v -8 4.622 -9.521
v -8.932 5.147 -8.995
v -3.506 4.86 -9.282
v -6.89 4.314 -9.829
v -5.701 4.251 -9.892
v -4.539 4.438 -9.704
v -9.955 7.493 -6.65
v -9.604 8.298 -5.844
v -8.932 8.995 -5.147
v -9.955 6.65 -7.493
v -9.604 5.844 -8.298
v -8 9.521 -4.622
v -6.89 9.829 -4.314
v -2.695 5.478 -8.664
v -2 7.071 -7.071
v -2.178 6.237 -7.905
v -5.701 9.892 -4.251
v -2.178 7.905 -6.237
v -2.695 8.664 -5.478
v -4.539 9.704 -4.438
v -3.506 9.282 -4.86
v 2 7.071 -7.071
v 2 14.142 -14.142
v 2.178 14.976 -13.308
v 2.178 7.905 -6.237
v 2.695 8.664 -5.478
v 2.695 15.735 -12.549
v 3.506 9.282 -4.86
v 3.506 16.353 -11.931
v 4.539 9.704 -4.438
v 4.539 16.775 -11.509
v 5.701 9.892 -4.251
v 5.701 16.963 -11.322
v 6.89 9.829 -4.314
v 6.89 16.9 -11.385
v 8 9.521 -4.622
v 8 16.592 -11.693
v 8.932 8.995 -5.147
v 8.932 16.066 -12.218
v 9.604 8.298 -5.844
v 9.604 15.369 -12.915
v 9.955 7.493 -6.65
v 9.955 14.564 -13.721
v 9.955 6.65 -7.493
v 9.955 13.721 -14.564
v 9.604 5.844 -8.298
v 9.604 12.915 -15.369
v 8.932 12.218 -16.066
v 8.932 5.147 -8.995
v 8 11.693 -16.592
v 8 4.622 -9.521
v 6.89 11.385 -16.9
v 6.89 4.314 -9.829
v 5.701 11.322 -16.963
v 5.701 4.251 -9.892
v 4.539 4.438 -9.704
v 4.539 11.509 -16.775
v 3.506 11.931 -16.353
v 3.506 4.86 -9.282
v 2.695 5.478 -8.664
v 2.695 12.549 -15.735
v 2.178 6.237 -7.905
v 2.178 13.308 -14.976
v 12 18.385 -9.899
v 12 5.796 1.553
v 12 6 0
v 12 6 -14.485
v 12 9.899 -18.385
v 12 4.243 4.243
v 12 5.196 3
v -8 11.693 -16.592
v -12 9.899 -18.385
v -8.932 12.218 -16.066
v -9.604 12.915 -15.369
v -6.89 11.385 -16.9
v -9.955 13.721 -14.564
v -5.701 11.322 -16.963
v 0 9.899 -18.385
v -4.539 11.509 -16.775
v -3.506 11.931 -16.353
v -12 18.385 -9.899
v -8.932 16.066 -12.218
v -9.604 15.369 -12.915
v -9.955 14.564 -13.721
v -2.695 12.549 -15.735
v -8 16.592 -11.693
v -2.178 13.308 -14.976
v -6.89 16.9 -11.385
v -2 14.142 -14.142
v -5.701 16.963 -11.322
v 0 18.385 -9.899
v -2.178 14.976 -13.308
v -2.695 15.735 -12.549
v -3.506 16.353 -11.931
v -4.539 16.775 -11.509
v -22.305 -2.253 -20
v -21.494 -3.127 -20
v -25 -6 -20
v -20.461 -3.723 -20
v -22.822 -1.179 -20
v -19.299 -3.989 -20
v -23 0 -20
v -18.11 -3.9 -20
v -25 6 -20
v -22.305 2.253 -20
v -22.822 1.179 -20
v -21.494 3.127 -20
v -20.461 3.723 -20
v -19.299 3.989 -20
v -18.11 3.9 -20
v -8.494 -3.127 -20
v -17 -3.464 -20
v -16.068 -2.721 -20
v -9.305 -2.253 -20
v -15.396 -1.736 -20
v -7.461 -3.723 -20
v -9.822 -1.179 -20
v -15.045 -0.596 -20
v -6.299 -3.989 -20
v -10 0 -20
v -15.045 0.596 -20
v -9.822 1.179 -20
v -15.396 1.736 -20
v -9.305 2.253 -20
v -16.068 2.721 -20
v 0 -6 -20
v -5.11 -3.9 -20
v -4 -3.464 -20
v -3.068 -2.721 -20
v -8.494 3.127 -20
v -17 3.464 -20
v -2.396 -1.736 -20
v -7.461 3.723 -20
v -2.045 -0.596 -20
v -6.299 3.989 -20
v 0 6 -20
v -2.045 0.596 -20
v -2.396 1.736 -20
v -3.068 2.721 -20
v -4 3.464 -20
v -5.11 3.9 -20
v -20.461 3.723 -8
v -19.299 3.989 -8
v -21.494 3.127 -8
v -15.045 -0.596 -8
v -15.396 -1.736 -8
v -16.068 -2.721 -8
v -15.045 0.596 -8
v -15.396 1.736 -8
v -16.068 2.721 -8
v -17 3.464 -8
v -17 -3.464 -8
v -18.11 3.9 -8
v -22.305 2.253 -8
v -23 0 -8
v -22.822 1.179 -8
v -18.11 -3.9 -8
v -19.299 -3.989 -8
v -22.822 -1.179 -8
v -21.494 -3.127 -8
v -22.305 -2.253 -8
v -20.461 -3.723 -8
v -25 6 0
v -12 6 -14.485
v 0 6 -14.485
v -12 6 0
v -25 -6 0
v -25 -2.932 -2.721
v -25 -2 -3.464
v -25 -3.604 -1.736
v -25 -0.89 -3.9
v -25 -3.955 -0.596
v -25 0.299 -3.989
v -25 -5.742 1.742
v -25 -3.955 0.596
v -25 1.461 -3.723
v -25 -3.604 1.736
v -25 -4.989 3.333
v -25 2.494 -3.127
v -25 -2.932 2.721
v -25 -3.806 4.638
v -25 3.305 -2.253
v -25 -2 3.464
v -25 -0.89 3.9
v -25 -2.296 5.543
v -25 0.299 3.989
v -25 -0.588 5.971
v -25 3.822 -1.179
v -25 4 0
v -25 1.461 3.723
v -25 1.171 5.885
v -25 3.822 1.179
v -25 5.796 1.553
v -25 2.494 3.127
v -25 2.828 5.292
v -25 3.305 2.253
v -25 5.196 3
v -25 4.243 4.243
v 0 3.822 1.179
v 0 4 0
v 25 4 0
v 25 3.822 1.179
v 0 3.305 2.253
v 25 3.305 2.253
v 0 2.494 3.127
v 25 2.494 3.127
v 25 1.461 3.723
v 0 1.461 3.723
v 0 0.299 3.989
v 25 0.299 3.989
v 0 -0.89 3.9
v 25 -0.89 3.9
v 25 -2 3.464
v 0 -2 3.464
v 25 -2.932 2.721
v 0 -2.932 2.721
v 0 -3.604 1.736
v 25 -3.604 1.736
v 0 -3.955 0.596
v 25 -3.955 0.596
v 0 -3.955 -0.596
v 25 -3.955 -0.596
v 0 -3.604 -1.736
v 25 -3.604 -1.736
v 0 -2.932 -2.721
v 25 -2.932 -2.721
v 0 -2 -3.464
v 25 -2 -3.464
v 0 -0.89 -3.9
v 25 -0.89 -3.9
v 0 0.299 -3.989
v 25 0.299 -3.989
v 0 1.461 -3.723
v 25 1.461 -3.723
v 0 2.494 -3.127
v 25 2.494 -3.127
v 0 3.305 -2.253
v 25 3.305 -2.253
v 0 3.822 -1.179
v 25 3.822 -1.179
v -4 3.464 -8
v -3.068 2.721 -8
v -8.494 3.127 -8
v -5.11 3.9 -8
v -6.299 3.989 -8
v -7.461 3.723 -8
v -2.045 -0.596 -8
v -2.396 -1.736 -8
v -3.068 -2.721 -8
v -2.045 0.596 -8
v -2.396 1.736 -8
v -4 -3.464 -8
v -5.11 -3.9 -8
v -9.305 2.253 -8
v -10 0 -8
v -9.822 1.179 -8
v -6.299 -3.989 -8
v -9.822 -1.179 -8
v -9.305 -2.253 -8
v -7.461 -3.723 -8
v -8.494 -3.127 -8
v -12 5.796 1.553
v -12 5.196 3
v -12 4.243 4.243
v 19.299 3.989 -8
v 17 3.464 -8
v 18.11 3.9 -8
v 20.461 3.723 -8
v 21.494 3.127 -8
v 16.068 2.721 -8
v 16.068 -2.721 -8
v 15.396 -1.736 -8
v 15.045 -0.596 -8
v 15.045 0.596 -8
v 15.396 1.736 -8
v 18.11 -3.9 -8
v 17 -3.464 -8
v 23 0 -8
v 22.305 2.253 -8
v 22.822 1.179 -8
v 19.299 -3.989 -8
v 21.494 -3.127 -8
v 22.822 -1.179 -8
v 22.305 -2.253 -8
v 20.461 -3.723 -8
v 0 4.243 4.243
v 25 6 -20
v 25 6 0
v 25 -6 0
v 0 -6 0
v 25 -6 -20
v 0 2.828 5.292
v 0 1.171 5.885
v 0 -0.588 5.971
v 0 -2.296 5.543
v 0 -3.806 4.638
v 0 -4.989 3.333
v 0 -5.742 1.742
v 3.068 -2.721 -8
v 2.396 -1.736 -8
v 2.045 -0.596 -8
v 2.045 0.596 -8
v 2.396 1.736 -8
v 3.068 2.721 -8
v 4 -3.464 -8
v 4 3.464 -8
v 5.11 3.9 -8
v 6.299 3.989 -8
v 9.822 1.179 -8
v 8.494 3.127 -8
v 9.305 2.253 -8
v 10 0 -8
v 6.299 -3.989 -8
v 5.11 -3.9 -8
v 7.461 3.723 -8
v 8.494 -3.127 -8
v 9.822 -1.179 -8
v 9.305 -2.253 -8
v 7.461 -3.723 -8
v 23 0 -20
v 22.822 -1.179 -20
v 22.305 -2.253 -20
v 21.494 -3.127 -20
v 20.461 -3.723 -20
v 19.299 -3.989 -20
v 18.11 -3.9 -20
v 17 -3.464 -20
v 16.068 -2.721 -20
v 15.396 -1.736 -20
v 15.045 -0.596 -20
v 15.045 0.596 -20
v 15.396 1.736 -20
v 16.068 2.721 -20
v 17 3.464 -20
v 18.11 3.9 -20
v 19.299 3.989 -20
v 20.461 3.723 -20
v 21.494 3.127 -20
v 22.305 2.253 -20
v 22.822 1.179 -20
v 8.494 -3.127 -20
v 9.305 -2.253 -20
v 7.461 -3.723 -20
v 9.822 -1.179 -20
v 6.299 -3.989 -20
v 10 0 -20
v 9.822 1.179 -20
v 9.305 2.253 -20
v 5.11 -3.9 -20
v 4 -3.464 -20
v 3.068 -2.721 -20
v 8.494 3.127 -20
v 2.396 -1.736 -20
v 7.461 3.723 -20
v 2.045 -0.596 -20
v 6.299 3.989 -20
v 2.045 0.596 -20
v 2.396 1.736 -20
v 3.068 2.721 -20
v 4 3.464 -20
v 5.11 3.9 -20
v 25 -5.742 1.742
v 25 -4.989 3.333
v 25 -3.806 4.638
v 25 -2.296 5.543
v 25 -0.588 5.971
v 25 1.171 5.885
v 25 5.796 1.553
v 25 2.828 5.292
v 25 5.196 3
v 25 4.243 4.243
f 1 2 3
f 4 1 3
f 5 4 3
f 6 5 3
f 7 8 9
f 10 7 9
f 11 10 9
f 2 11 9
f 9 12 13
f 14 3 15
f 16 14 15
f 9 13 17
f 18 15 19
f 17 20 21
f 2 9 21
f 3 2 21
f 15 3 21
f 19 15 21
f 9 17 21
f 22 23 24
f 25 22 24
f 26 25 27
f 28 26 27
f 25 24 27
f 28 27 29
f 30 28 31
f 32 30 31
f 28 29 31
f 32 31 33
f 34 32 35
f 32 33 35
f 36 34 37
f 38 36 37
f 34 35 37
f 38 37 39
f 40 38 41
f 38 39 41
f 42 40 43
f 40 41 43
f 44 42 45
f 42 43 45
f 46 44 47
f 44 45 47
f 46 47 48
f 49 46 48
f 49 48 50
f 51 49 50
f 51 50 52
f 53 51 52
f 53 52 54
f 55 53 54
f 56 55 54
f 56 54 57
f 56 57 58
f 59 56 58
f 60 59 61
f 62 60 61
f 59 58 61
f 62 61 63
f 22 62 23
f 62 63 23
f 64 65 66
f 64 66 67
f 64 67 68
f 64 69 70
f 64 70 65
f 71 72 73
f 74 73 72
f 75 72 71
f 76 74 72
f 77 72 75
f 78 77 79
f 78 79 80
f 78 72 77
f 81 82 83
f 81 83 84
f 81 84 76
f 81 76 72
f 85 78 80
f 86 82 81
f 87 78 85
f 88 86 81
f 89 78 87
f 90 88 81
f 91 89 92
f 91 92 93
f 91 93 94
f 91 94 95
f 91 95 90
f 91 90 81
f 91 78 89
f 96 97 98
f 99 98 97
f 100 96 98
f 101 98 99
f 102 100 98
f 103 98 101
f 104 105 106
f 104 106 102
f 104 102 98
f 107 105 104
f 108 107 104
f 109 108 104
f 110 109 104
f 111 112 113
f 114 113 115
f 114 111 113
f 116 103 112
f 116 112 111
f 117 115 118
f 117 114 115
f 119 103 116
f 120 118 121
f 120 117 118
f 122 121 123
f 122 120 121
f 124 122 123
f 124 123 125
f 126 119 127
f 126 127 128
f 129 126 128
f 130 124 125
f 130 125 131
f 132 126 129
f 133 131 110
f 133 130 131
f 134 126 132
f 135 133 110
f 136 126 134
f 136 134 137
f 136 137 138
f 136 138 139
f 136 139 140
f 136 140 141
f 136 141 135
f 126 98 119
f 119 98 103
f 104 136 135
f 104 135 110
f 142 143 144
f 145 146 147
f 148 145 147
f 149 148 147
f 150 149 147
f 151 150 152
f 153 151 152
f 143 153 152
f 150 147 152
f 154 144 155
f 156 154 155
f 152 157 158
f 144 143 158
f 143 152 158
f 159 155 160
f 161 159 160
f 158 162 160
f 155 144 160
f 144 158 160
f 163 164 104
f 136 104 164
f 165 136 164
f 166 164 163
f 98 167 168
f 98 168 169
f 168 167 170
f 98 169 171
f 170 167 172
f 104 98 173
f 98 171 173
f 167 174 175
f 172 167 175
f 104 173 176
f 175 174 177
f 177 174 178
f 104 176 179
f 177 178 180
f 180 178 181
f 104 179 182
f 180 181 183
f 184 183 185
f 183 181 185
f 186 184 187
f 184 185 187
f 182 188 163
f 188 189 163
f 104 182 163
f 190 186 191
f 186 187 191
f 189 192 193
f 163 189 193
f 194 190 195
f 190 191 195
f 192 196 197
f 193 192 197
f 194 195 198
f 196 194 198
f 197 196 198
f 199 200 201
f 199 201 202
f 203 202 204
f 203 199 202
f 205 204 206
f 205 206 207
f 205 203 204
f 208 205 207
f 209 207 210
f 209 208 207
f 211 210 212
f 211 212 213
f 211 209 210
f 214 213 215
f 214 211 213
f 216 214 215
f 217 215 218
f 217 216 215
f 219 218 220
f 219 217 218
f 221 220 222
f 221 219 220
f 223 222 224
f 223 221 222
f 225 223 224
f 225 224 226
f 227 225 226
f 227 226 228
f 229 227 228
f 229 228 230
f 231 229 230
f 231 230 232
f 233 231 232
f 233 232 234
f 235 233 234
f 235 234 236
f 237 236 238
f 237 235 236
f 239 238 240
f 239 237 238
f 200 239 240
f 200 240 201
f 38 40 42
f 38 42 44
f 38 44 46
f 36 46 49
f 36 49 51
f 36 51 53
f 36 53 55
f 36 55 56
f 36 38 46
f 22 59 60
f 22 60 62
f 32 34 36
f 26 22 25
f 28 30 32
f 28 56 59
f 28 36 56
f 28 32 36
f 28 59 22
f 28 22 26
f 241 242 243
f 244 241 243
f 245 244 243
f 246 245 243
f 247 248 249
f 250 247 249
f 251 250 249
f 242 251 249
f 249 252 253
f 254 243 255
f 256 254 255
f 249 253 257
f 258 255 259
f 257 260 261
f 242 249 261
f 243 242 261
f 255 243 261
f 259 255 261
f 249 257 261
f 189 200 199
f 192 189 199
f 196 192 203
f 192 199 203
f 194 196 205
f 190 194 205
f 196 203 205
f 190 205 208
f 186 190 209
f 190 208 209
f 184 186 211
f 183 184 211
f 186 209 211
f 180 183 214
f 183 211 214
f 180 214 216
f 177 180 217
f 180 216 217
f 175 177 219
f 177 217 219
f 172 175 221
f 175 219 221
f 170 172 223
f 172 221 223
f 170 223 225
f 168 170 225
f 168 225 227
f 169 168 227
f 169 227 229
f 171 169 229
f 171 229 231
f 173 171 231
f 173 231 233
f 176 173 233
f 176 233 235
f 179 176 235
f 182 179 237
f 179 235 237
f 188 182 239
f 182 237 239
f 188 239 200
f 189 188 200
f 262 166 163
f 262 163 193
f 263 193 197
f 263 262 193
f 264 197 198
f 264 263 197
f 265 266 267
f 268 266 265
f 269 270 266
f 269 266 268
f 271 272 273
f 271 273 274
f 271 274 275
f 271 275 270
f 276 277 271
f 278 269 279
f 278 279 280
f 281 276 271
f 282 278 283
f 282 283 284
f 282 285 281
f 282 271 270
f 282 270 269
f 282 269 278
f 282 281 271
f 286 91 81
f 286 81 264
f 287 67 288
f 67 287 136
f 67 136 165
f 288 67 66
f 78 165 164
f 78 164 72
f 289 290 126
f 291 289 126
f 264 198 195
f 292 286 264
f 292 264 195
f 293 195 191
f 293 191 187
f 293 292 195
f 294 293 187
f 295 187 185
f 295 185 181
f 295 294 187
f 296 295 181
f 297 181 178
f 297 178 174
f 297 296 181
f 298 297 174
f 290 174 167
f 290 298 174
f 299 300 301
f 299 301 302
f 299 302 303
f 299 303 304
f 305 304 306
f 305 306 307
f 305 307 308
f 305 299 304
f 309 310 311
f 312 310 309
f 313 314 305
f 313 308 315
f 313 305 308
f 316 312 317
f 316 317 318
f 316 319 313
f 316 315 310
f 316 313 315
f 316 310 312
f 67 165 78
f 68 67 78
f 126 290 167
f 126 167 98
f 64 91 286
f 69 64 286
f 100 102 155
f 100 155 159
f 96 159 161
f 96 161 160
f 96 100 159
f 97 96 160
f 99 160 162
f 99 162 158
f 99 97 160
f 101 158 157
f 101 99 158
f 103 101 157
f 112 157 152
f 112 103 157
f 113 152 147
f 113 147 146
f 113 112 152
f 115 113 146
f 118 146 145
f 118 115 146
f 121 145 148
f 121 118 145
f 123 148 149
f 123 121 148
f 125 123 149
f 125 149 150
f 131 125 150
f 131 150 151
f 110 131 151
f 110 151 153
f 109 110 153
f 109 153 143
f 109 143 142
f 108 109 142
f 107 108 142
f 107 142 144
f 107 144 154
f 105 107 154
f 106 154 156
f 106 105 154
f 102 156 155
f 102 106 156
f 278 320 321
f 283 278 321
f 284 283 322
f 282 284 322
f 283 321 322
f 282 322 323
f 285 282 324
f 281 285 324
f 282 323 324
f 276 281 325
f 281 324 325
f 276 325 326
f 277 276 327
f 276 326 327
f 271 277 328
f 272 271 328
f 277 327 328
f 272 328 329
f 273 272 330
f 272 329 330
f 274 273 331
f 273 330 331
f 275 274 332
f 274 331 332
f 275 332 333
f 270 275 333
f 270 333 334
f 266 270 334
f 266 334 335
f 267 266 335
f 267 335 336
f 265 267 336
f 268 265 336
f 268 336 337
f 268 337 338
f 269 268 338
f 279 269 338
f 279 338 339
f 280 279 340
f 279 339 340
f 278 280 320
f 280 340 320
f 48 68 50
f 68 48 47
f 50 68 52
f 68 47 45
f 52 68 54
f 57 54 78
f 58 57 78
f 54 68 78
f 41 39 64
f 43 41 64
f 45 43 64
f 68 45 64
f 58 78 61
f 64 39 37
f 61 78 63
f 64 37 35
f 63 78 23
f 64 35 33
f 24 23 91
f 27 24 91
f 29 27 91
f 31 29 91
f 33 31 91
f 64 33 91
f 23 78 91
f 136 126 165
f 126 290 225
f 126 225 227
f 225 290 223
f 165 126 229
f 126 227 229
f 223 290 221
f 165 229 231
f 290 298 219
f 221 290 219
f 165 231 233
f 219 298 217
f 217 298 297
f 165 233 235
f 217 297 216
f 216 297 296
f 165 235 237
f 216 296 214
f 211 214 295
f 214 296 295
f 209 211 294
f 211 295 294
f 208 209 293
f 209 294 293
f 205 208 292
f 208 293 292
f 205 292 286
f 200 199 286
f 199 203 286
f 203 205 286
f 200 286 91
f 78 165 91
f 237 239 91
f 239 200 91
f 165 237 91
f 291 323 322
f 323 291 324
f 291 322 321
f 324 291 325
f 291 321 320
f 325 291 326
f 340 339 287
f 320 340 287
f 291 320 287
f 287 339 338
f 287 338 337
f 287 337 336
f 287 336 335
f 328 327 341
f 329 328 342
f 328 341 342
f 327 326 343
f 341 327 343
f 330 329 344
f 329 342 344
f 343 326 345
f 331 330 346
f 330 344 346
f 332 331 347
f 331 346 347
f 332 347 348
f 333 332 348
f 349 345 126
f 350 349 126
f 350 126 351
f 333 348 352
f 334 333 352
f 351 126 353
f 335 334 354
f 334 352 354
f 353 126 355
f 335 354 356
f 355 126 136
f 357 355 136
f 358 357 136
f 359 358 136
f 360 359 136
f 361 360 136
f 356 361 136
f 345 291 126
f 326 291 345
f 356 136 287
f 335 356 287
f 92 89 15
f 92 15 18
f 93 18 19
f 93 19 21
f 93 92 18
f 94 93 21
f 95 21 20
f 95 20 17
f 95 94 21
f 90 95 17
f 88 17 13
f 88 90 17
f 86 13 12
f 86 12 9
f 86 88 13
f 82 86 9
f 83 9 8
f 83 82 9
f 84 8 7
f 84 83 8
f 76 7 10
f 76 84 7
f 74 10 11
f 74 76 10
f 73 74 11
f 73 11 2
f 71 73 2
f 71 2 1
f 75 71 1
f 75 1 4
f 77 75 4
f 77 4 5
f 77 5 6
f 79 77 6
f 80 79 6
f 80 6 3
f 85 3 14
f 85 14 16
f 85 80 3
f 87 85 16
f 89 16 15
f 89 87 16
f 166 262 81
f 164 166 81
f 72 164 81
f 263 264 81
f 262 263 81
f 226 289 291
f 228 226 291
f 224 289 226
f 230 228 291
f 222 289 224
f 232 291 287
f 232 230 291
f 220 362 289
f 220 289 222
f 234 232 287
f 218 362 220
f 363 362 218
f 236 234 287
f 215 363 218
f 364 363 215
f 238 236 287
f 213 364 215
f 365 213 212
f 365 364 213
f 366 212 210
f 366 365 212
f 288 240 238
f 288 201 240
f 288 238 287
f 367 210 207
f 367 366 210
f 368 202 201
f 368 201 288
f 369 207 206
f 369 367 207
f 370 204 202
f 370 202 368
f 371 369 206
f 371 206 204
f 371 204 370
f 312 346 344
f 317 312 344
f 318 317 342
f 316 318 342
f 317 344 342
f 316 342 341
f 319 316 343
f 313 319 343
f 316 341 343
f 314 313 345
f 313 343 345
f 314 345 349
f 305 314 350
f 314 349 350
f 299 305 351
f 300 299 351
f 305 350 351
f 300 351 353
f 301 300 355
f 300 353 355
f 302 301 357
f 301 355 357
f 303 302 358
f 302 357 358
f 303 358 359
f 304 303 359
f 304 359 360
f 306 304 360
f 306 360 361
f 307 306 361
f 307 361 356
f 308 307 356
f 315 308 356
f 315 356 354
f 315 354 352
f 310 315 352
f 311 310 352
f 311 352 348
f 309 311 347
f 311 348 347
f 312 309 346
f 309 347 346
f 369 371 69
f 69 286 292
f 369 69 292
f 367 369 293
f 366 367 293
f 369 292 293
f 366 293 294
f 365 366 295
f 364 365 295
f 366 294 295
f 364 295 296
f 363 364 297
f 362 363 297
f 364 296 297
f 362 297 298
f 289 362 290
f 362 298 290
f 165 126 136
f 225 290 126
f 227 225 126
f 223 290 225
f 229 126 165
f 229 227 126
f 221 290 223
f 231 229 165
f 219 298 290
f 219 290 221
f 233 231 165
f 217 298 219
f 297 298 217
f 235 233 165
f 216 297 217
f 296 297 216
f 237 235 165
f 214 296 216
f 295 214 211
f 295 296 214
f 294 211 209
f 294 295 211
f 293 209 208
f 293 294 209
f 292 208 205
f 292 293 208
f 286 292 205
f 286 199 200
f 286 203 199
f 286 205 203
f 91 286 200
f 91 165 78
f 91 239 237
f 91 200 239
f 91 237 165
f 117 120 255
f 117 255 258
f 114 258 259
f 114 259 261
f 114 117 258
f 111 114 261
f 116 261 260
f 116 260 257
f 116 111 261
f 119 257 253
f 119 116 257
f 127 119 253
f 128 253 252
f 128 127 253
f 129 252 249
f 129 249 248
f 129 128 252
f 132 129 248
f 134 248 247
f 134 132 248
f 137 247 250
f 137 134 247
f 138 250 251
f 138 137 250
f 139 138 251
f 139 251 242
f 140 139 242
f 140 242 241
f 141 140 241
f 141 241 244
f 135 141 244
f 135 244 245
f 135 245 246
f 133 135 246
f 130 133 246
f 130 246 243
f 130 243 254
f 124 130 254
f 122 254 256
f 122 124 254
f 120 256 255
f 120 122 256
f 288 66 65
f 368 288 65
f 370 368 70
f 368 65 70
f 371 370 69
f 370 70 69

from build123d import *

# Parameters (mm, degrees)
F0_R     = 4
F1_DEPTH = 25
F2_DEPTH = 12
F3_R     = 4
F4_DEPTH = 12
F5_R     = 4
F6_DEPTH = 10


with BuildPart() as f1:
    # F0 (on Right) → F1 (new body)
    with BuildSketch(Plane.YZ):
        with BuildLine():
            Line((6, -14.4852813742), (-4.2426406871, -4.2426406871))
            ThreePointArc((-4.2426406871, -4.2426406871), (-5.5432771951, -2.2961005942), (-6, 0))
            Line((-6, 0), (-6, -20))
            Line((-6, -20), (6, -20))
            Line((6, -20), (6, -14.4852813742))
        make_face()
        with BuildLine():
            Line((6, -14.4852813742), (6, 0))
            ThreePointArc((6, 0), (2.2961005942, -5.5432771951), (-4.2426406871, -4.2426406871))
            Line((-4.2426406871, -4.2426406871), (6, -14.4852813742))
        make_face()
        with BuildLine():
            ThreePointArc((-4.2426406871, -4.2426406871), (2.2961005942, -5.5432771951), (6, 0))
            ThreePointArc((6, 0), (5.5432771951, 2.2961005942), (4.2426406871, 4.2426406871))
            ThreePointArc((4.2426406871, 4.2426406871), (-2.2961005942, 5.5432771951), (-6, 0))
            ThreePointArc((-6, 0), (-5.5432771951, -2.2961005942), (-4.2426406871, -4.2426406871))
        make_face()
        Circle(F0_R, mode=Mode.SUBTRACT)
    extrude(amount=F1_DEPTH)

    # F0 (on Right) → F2 (join)
    with BuildSketch(Plane.YZ):
        with BuildLine():
            ThreePointArc((4.2426406871, 4.2426406871), (5.5432771951, 2.2961005942), (6, 0))
            Line((6, 0), (6, -14.4852813742))
            Line((6, -14.4852813742), (9.8994949366, -18.3847763109))
            Line((9.8994949366, -18.3847763109), (18.3847763109, -9.8994949366))
            Line((18.3847763109, -9.8994949366), (4.2426406871, 4.2426406871))
        make_face()
    extrude(amount=F2_DEPTH)

    # F3 (on face) → F4 (cut)
    with BuildSketch(Plane(origin=(0, 0, -20), x_dir=(1, 0, 0), z_dir=(0, 0, -1))):
        with Locations((19, 0)):
            Circle(F3_R)
        with Locations((6, 0)):
            Circle(F3_R)
    extrude(amount=-F4_DEPTH, mode=Mode.SUBTRACT)

    # F5 (on face) → F6 (cut)
    with BuildSketch(Plane(origin=(0, 14.1421356237, -14.1421356237), x_dir=(-1, 0, 0), z_dir=(0, 0.7071067812, -0.7071067812))):
        with Locations((-6, 0)):
            Circle(F5_R)
    extrude(amount=-F6_DEPTH, mode=Mode.SUBTRACT)


with BuildPart() as f7_1:
    # F7: instance of F1
    add(f1.part.mirror(Plane.YZ))


solid = Compound([f1.part, f7_1.part])
